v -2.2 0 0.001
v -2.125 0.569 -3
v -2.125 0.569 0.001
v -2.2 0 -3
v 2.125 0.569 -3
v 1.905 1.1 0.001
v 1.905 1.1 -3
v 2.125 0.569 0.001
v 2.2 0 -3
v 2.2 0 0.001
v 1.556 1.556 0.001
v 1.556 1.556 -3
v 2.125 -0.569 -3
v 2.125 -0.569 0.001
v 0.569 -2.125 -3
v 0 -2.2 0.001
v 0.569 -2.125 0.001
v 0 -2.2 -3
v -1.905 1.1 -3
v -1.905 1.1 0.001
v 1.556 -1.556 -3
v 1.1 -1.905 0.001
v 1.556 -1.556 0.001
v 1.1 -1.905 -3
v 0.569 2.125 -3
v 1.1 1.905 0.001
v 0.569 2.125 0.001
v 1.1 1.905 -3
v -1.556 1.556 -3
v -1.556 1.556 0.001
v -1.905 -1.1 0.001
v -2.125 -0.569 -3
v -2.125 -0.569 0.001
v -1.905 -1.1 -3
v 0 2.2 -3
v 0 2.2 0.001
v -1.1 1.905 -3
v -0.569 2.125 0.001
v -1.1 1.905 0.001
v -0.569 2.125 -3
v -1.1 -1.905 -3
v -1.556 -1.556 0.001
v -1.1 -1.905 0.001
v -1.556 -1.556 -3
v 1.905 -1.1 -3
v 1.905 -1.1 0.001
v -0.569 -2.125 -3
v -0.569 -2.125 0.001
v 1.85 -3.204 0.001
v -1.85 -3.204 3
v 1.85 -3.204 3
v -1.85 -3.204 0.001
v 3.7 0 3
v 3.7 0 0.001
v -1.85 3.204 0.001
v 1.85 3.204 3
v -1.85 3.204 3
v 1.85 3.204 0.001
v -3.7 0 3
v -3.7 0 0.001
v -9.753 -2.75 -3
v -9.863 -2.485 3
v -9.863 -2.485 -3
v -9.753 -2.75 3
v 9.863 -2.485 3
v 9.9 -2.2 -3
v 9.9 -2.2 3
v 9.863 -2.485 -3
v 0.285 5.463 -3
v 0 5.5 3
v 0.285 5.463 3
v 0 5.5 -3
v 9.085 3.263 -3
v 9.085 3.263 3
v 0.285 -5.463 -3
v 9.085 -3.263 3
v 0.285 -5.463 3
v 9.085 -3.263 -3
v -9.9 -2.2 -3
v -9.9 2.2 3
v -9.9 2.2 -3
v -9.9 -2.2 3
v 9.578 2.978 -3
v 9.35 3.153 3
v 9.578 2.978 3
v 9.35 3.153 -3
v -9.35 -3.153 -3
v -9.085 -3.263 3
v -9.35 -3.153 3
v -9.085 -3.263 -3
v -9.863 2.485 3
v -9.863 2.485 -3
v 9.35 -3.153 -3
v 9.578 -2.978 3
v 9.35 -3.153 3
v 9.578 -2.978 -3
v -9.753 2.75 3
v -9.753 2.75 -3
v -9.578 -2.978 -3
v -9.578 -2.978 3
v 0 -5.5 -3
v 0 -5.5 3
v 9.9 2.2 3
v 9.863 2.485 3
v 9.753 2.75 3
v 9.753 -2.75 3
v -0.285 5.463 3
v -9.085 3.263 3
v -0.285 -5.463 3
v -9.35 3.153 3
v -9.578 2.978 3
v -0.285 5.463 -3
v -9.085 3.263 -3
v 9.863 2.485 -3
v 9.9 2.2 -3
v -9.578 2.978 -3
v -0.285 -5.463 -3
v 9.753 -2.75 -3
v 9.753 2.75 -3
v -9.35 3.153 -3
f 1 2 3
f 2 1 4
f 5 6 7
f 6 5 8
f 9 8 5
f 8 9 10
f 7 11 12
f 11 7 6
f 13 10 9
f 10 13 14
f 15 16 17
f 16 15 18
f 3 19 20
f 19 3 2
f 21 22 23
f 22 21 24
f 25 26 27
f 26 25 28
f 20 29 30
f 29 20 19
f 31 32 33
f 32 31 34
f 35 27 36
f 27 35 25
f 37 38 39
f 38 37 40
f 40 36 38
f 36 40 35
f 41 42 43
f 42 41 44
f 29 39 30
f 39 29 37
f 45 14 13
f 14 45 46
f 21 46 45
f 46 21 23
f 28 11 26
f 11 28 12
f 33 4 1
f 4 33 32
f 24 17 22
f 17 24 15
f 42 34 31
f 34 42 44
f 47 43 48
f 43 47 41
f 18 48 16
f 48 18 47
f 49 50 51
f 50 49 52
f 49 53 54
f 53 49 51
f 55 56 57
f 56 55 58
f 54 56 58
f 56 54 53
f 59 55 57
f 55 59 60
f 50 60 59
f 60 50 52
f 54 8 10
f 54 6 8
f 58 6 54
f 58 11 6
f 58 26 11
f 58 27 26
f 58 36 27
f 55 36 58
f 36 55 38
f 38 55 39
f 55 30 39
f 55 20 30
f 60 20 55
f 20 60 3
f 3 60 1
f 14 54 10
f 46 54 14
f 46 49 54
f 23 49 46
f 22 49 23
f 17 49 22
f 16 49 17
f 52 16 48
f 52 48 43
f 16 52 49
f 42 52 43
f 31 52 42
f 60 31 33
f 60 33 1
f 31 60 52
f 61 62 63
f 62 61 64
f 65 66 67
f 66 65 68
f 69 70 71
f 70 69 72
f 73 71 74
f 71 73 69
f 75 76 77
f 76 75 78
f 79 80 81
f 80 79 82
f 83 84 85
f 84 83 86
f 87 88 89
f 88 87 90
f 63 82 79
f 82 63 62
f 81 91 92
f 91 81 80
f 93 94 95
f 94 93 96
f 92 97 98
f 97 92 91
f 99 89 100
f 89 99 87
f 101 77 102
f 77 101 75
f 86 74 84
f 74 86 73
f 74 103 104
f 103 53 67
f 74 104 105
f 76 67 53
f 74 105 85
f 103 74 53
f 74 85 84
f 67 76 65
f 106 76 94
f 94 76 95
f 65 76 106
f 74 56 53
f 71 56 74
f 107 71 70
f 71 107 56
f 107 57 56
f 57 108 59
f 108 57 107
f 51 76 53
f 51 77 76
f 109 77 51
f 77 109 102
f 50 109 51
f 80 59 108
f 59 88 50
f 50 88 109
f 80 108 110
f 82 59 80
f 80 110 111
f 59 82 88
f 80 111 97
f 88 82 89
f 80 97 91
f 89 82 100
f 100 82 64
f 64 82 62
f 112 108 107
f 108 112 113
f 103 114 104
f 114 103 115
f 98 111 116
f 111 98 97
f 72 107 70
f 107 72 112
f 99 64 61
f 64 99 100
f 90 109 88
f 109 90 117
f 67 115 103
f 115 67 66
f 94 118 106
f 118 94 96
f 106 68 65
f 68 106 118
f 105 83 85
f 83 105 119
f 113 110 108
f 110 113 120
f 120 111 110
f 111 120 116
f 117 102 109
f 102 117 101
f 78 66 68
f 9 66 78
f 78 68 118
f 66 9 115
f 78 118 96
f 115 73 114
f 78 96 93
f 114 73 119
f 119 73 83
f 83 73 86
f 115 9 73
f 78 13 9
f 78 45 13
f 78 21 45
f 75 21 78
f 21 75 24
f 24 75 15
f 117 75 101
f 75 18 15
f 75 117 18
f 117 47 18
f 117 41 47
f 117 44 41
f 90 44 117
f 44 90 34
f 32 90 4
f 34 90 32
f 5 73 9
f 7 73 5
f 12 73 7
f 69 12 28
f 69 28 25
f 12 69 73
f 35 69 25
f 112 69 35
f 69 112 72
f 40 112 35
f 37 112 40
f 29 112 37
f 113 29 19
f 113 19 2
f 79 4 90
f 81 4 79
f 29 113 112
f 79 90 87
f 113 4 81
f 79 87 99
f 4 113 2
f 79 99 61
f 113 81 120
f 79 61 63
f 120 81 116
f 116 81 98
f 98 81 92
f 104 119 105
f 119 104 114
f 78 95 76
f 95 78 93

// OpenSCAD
// Wing bolt

// Copyright (C) 2015 Jeremy Bennett <jeremy@jeremybennett.com>

// Contributor: Jeremy Bennett <jeremy@jeremybennett.com>

// This file is licensed under the Creative Commons Attribution-ShareAlike 3.0
// Unported License. To view a copy of this license, visit
// http://creativecommons.org/licenses/by-sa/3.0/ or send a letter to Creative
// Commons, PO Box 1866, Mountain View, CA 94042, USA.

// 45678901234567890123456789012345678901234567890123456789012345678901234567890


// Wing bolts are really hard to obtain.  This is a cover for a standard hex
// head M4 bolt, so it can be turned into a wing bolt


// Small amount to ensure overaps when needed
EPS = 0.001;

// Amount around threads, heads etc, to allow for printer overflow
GAP = 0.2;

// Standard constants
M3_SHANK_R = 3.0 / 2 + GAP;
M3_HEAD_R   = 5.5 / 2 + GAP;
M4_SHANK_R = 4.0 / 2 + GAP;
M4_HEAD_R   = 7.0 / 2 + GAP;
M5_SHANK_R = 5.0 / 2 + GAP;
M5_HEAD_R   = 8.0 / 2 + GAP;

// Our specific
SHANK_R = M4_SHANK_R;
HEAD_R  = M4_HEAD_R;
HEAD_H  = 3.0;
HEIGHT  = HEAD_H * 2;

// Main wing shape
module  wing_block () {
    cr = SHANK_R / 2;
    hull () {
        // Left
        translate (v = [SHANK_R * 4, SHANK_R, 0])
            cylinder (r = cr, h = HEIGHT, center = true, $fn = 24);
        translate (v = [SHANK_R * 4, -SHANK_R, 0])
            cylinder (r = cr, h = HEIGHT, center = true, $fn = 24);
        // Center
        translate (v = [0, 2 * SHANK_R, 0])
            cylinder (r = cr, h = HEIGHT, center = true, $fn = 24);
        translate (v = [0, -2 * SHANK_R, 0])
            cylinder (r = cr, h = HEIGHT, center = true, $fn = 24);
        // Right
        translate (v = [-SHANK_R * 4, SHANK_R, 0])
            cylinder (r = cr, h = HEIGHT, center = true, $fn = 24);
        translate (v = [-SHANK_R * 4, -SHANK_R, 0])
            cylinder (r = cr, h = HEIGHT, center = true, $fn = 24);
    }
}


// Bolt hole
module bolt_hole () {
    union () {
        cylinder (r = SHANK_R, h = HEIGHT + EPS, center = true, $fn = 24);
        translate (v = [0, 0, (HEIGHT - HEAD_H) / 2 + EPS])
            cylinder (r = HEAD_R, h = HEAD_H, center = true, $fn = 6);
    }
}


module  wing_bolt () {
    difference () {
        wing_block ();
        bolt_hole ();
    }
}


wing_bolt ();
